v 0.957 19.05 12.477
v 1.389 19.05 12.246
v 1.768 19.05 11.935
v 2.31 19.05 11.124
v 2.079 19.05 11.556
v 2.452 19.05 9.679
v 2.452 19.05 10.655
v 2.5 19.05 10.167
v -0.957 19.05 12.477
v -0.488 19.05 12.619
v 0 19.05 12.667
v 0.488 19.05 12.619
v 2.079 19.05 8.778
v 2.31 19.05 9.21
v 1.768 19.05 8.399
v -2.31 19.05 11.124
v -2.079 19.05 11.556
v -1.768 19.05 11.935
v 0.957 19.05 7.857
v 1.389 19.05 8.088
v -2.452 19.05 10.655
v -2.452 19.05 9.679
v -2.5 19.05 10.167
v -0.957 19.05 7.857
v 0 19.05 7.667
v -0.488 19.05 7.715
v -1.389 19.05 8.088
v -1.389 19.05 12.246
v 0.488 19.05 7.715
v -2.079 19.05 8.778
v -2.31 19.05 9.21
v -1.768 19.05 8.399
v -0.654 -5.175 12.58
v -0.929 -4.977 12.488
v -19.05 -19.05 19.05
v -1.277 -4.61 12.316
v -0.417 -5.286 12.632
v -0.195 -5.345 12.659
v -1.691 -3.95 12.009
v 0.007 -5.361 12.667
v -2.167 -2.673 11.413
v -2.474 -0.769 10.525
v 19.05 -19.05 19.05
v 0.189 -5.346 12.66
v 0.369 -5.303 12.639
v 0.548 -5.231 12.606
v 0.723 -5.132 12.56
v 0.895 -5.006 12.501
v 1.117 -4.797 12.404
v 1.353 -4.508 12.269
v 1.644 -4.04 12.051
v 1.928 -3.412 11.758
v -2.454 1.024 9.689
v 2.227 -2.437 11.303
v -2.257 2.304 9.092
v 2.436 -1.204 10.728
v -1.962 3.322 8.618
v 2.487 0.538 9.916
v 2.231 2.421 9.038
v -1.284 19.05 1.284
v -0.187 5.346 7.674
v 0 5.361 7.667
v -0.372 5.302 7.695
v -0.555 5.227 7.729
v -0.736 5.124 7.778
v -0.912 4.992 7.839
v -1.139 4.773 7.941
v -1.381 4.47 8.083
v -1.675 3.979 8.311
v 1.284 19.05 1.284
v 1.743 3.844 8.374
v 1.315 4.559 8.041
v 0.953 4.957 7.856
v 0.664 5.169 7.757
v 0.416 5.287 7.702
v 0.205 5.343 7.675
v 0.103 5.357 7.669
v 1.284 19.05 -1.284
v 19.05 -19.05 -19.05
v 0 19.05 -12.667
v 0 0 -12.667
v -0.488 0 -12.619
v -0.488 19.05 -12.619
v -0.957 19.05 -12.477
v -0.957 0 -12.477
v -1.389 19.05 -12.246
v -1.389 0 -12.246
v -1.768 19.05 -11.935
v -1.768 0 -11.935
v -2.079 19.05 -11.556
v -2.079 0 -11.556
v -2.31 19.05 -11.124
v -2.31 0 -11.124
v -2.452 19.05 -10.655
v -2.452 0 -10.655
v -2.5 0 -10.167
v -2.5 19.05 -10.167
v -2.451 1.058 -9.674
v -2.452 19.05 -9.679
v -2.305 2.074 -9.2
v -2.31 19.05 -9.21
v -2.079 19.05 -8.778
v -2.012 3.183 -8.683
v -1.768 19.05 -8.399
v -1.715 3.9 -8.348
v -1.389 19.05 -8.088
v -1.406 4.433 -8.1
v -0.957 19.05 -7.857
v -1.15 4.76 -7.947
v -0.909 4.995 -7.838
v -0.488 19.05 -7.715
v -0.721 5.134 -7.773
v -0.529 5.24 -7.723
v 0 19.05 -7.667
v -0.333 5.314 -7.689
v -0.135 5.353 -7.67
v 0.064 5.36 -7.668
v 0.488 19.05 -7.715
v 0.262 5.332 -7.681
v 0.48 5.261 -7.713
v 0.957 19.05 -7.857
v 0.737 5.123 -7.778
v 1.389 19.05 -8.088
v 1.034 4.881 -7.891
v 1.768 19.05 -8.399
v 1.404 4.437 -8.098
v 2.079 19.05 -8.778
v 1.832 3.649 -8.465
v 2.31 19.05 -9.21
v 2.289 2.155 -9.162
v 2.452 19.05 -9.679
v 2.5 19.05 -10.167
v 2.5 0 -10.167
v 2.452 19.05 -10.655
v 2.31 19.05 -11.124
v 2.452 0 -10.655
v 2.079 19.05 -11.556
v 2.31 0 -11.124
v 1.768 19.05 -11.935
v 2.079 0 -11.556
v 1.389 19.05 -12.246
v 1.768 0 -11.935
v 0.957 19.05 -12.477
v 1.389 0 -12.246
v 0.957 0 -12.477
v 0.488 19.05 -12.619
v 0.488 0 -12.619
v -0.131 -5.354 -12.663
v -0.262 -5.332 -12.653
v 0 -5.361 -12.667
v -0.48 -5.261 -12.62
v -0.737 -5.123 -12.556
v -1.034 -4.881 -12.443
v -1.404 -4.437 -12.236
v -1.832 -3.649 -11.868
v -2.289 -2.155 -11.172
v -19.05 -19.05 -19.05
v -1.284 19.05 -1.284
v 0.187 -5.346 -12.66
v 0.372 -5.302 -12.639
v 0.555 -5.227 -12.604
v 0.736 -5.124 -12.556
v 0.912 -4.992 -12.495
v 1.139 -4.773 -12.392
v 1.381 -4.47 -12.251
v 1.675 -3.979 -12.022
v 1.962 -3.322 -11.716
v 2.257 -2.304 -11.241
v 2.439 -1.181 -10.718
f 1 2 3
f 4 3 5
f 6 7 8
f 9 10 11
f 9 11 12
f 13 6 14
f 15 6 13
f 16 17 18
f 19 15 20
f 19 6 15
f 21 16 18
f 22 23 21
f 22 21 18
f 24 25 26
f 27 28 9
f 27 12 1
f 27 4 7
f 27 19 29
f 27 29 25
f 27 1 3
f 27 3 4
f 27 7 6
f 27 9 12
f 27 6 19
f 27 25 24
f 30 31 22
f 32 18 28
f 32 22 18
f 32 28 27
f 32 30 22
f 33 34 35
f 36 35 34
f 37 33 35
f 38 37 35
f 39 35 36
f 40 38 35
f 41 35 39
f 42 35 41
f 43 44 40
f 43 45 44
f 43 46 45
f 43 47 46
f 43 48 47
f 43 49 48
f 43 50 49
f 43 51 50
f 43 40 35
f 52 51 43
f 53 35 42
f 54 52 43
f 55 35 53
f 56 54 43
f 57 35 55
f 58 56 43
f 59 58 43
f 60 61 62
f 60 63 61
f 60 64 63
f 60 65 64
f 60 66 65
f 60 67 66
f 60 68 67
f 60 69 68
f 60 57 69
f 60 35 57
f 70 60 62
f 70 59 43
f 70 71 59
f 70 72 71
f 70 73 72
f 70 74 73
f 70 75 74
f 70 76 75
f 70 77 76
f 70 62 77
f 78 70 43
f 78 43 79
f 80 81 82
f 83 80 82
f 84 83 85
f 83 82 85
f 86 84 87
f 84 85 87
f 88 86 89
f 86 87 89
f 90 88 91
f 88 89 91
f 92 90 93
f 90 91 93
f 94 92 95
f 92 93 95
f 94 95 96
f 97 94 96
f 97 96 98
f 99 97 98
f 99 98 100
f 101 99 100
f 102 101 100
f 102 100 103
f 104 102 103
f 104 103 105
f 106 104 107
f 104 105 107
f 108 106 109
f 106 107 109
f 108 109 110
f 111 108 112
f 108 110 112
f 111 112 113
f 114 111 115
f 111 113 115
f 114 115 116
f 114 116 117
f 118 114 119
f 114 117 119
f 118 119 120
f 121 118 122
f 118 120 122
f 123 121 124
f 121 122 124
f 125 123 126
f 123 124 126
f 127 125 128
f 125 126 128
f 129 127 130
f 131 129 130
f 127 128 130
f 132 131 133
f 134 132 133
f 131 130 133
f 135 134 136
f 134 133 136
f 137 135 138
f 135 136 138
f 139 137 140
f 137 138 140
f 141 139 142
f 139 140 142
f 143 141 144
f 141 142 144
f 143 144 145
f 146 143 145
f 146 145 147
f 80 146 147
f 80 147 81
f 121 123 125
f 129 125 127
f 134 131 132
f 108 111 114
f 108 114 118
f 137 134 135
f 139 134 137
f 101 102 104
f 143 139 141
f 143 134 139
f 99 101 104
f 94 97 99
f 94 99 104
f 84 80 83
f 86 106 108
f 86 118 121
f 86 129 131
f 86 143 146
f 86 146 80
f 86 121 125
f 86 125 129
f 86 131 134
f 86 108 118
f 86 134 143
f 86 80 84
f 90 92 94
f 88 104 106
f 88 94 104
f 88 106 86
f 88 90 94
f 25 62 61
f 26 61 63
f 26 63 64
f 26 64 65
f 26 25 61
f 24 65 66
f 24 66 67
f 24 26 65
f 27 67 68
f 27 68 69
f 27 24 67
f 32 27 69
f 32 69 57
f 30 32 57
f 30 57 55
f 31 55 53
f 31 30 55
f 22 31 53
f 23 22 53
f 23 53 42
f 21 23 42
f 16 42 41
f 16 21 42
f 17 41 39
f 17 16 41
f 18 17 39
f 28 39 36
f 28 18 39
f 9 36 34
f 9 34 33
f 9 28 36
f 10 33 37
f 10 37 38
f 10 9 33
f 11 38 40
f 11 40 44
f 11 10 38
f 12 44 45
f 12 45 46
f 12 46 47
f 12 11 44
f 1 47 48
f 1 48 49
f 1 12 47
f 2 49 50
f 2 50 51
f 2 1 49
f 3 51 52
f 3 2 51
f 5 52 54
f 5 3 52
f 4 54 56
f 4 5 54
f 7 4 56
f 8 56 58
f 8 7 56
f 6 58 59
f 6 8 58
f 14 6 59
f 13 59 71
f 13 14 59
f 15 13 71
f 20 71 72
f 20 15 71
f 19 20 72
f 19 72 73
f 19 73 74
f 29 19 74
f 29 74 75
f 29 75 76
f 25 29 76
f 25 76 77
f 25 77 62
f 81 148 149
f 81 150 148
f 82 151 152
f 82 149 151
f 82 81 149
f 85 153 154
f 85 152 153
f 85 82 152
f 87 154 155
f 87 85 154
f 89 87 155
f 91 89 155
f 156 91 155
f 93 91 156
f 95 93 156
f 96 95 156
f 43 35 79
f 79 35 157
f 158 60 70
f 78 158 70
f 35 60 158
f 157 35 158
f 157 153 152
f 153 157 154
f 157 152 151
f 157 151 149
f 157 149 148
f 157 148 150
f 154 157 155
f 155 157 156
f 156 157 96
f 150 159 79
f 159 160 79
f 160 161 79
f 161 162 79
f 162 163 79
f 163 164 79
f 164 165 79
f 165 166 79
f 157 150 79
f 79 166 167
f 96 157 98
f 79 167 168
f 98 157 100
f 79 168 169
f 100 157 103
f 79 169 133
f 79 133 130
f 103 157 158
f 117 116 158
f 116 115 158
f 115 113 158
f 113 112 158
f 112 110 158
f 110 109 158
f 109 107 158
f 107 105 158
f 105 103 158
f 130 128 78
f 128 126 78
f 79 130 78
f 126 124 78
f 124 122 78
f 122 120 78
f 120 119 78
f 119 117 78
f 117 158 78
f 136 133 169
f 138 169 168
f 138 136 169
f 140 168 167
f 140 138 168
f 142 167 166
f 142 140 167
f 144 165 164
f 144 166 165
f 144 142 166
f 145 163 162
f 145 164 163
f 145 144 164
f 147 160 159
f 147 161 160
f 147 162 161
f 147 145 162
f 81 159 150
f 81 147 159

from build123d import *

# Parameters (mm, degrees)
SKETCH1_W           = 38.1
SKETCH1_H           = 38.1
BOSS_EXTRUDE1_DEPTH = 19.05
DRAFT1_ANGLE        = -25
SKETCH2_R           = 2.5
BOSS_EXTRUDE3_DEPTH = 19.05


with BuildPart() as part:
    # Sketch1 → Boss-Extrude1 (new, symmetric)
    with BuildSketch(Plane(origin=(0, 0, 0), x_dir=(1, 0, 0), z_dir=(0, 1, 0))):
        Rectangle(SKETCH1_W, SKETCH1_H)
    extrude(amount=BOSS_EXTRUDE1_DEPTH, both=True)

    # Draft1
    draft1_faces = [part.faces().sort_by_distance(p)[0] for p in [
        (-19.05, 0, 0),
        (0, 0, 19.05),
        (19.05, 0, 0),
        (0, 0, -19.05),
    ]]
    draft(draft1_faces, Plane(origin=(0, -19.05, 0), x_dir=(0, 0, -1), z_dir=(0, -1, 0)), DRAFT1_ANGLE)

    # Sketch2 → Boss-Extrude3 (add, symmetric)
    with BuildSketch(Plane(origin=(0, 0, 0), x_dir=(1, 0, 0), z_dir=(0, 1, 0))):
        with Locations(Location((0, 10.166839112, 0), (0, 0, 90))):
            Circle(SKETCH2_R)
        with Locations(Location((0, -10.166839112, 0), (0, 0, 90))):
            Circle(SKETCH2_R)
    extrude(amount=BOSS_EXTRUDE3_DEPTH, both=True)


solid = part.part
